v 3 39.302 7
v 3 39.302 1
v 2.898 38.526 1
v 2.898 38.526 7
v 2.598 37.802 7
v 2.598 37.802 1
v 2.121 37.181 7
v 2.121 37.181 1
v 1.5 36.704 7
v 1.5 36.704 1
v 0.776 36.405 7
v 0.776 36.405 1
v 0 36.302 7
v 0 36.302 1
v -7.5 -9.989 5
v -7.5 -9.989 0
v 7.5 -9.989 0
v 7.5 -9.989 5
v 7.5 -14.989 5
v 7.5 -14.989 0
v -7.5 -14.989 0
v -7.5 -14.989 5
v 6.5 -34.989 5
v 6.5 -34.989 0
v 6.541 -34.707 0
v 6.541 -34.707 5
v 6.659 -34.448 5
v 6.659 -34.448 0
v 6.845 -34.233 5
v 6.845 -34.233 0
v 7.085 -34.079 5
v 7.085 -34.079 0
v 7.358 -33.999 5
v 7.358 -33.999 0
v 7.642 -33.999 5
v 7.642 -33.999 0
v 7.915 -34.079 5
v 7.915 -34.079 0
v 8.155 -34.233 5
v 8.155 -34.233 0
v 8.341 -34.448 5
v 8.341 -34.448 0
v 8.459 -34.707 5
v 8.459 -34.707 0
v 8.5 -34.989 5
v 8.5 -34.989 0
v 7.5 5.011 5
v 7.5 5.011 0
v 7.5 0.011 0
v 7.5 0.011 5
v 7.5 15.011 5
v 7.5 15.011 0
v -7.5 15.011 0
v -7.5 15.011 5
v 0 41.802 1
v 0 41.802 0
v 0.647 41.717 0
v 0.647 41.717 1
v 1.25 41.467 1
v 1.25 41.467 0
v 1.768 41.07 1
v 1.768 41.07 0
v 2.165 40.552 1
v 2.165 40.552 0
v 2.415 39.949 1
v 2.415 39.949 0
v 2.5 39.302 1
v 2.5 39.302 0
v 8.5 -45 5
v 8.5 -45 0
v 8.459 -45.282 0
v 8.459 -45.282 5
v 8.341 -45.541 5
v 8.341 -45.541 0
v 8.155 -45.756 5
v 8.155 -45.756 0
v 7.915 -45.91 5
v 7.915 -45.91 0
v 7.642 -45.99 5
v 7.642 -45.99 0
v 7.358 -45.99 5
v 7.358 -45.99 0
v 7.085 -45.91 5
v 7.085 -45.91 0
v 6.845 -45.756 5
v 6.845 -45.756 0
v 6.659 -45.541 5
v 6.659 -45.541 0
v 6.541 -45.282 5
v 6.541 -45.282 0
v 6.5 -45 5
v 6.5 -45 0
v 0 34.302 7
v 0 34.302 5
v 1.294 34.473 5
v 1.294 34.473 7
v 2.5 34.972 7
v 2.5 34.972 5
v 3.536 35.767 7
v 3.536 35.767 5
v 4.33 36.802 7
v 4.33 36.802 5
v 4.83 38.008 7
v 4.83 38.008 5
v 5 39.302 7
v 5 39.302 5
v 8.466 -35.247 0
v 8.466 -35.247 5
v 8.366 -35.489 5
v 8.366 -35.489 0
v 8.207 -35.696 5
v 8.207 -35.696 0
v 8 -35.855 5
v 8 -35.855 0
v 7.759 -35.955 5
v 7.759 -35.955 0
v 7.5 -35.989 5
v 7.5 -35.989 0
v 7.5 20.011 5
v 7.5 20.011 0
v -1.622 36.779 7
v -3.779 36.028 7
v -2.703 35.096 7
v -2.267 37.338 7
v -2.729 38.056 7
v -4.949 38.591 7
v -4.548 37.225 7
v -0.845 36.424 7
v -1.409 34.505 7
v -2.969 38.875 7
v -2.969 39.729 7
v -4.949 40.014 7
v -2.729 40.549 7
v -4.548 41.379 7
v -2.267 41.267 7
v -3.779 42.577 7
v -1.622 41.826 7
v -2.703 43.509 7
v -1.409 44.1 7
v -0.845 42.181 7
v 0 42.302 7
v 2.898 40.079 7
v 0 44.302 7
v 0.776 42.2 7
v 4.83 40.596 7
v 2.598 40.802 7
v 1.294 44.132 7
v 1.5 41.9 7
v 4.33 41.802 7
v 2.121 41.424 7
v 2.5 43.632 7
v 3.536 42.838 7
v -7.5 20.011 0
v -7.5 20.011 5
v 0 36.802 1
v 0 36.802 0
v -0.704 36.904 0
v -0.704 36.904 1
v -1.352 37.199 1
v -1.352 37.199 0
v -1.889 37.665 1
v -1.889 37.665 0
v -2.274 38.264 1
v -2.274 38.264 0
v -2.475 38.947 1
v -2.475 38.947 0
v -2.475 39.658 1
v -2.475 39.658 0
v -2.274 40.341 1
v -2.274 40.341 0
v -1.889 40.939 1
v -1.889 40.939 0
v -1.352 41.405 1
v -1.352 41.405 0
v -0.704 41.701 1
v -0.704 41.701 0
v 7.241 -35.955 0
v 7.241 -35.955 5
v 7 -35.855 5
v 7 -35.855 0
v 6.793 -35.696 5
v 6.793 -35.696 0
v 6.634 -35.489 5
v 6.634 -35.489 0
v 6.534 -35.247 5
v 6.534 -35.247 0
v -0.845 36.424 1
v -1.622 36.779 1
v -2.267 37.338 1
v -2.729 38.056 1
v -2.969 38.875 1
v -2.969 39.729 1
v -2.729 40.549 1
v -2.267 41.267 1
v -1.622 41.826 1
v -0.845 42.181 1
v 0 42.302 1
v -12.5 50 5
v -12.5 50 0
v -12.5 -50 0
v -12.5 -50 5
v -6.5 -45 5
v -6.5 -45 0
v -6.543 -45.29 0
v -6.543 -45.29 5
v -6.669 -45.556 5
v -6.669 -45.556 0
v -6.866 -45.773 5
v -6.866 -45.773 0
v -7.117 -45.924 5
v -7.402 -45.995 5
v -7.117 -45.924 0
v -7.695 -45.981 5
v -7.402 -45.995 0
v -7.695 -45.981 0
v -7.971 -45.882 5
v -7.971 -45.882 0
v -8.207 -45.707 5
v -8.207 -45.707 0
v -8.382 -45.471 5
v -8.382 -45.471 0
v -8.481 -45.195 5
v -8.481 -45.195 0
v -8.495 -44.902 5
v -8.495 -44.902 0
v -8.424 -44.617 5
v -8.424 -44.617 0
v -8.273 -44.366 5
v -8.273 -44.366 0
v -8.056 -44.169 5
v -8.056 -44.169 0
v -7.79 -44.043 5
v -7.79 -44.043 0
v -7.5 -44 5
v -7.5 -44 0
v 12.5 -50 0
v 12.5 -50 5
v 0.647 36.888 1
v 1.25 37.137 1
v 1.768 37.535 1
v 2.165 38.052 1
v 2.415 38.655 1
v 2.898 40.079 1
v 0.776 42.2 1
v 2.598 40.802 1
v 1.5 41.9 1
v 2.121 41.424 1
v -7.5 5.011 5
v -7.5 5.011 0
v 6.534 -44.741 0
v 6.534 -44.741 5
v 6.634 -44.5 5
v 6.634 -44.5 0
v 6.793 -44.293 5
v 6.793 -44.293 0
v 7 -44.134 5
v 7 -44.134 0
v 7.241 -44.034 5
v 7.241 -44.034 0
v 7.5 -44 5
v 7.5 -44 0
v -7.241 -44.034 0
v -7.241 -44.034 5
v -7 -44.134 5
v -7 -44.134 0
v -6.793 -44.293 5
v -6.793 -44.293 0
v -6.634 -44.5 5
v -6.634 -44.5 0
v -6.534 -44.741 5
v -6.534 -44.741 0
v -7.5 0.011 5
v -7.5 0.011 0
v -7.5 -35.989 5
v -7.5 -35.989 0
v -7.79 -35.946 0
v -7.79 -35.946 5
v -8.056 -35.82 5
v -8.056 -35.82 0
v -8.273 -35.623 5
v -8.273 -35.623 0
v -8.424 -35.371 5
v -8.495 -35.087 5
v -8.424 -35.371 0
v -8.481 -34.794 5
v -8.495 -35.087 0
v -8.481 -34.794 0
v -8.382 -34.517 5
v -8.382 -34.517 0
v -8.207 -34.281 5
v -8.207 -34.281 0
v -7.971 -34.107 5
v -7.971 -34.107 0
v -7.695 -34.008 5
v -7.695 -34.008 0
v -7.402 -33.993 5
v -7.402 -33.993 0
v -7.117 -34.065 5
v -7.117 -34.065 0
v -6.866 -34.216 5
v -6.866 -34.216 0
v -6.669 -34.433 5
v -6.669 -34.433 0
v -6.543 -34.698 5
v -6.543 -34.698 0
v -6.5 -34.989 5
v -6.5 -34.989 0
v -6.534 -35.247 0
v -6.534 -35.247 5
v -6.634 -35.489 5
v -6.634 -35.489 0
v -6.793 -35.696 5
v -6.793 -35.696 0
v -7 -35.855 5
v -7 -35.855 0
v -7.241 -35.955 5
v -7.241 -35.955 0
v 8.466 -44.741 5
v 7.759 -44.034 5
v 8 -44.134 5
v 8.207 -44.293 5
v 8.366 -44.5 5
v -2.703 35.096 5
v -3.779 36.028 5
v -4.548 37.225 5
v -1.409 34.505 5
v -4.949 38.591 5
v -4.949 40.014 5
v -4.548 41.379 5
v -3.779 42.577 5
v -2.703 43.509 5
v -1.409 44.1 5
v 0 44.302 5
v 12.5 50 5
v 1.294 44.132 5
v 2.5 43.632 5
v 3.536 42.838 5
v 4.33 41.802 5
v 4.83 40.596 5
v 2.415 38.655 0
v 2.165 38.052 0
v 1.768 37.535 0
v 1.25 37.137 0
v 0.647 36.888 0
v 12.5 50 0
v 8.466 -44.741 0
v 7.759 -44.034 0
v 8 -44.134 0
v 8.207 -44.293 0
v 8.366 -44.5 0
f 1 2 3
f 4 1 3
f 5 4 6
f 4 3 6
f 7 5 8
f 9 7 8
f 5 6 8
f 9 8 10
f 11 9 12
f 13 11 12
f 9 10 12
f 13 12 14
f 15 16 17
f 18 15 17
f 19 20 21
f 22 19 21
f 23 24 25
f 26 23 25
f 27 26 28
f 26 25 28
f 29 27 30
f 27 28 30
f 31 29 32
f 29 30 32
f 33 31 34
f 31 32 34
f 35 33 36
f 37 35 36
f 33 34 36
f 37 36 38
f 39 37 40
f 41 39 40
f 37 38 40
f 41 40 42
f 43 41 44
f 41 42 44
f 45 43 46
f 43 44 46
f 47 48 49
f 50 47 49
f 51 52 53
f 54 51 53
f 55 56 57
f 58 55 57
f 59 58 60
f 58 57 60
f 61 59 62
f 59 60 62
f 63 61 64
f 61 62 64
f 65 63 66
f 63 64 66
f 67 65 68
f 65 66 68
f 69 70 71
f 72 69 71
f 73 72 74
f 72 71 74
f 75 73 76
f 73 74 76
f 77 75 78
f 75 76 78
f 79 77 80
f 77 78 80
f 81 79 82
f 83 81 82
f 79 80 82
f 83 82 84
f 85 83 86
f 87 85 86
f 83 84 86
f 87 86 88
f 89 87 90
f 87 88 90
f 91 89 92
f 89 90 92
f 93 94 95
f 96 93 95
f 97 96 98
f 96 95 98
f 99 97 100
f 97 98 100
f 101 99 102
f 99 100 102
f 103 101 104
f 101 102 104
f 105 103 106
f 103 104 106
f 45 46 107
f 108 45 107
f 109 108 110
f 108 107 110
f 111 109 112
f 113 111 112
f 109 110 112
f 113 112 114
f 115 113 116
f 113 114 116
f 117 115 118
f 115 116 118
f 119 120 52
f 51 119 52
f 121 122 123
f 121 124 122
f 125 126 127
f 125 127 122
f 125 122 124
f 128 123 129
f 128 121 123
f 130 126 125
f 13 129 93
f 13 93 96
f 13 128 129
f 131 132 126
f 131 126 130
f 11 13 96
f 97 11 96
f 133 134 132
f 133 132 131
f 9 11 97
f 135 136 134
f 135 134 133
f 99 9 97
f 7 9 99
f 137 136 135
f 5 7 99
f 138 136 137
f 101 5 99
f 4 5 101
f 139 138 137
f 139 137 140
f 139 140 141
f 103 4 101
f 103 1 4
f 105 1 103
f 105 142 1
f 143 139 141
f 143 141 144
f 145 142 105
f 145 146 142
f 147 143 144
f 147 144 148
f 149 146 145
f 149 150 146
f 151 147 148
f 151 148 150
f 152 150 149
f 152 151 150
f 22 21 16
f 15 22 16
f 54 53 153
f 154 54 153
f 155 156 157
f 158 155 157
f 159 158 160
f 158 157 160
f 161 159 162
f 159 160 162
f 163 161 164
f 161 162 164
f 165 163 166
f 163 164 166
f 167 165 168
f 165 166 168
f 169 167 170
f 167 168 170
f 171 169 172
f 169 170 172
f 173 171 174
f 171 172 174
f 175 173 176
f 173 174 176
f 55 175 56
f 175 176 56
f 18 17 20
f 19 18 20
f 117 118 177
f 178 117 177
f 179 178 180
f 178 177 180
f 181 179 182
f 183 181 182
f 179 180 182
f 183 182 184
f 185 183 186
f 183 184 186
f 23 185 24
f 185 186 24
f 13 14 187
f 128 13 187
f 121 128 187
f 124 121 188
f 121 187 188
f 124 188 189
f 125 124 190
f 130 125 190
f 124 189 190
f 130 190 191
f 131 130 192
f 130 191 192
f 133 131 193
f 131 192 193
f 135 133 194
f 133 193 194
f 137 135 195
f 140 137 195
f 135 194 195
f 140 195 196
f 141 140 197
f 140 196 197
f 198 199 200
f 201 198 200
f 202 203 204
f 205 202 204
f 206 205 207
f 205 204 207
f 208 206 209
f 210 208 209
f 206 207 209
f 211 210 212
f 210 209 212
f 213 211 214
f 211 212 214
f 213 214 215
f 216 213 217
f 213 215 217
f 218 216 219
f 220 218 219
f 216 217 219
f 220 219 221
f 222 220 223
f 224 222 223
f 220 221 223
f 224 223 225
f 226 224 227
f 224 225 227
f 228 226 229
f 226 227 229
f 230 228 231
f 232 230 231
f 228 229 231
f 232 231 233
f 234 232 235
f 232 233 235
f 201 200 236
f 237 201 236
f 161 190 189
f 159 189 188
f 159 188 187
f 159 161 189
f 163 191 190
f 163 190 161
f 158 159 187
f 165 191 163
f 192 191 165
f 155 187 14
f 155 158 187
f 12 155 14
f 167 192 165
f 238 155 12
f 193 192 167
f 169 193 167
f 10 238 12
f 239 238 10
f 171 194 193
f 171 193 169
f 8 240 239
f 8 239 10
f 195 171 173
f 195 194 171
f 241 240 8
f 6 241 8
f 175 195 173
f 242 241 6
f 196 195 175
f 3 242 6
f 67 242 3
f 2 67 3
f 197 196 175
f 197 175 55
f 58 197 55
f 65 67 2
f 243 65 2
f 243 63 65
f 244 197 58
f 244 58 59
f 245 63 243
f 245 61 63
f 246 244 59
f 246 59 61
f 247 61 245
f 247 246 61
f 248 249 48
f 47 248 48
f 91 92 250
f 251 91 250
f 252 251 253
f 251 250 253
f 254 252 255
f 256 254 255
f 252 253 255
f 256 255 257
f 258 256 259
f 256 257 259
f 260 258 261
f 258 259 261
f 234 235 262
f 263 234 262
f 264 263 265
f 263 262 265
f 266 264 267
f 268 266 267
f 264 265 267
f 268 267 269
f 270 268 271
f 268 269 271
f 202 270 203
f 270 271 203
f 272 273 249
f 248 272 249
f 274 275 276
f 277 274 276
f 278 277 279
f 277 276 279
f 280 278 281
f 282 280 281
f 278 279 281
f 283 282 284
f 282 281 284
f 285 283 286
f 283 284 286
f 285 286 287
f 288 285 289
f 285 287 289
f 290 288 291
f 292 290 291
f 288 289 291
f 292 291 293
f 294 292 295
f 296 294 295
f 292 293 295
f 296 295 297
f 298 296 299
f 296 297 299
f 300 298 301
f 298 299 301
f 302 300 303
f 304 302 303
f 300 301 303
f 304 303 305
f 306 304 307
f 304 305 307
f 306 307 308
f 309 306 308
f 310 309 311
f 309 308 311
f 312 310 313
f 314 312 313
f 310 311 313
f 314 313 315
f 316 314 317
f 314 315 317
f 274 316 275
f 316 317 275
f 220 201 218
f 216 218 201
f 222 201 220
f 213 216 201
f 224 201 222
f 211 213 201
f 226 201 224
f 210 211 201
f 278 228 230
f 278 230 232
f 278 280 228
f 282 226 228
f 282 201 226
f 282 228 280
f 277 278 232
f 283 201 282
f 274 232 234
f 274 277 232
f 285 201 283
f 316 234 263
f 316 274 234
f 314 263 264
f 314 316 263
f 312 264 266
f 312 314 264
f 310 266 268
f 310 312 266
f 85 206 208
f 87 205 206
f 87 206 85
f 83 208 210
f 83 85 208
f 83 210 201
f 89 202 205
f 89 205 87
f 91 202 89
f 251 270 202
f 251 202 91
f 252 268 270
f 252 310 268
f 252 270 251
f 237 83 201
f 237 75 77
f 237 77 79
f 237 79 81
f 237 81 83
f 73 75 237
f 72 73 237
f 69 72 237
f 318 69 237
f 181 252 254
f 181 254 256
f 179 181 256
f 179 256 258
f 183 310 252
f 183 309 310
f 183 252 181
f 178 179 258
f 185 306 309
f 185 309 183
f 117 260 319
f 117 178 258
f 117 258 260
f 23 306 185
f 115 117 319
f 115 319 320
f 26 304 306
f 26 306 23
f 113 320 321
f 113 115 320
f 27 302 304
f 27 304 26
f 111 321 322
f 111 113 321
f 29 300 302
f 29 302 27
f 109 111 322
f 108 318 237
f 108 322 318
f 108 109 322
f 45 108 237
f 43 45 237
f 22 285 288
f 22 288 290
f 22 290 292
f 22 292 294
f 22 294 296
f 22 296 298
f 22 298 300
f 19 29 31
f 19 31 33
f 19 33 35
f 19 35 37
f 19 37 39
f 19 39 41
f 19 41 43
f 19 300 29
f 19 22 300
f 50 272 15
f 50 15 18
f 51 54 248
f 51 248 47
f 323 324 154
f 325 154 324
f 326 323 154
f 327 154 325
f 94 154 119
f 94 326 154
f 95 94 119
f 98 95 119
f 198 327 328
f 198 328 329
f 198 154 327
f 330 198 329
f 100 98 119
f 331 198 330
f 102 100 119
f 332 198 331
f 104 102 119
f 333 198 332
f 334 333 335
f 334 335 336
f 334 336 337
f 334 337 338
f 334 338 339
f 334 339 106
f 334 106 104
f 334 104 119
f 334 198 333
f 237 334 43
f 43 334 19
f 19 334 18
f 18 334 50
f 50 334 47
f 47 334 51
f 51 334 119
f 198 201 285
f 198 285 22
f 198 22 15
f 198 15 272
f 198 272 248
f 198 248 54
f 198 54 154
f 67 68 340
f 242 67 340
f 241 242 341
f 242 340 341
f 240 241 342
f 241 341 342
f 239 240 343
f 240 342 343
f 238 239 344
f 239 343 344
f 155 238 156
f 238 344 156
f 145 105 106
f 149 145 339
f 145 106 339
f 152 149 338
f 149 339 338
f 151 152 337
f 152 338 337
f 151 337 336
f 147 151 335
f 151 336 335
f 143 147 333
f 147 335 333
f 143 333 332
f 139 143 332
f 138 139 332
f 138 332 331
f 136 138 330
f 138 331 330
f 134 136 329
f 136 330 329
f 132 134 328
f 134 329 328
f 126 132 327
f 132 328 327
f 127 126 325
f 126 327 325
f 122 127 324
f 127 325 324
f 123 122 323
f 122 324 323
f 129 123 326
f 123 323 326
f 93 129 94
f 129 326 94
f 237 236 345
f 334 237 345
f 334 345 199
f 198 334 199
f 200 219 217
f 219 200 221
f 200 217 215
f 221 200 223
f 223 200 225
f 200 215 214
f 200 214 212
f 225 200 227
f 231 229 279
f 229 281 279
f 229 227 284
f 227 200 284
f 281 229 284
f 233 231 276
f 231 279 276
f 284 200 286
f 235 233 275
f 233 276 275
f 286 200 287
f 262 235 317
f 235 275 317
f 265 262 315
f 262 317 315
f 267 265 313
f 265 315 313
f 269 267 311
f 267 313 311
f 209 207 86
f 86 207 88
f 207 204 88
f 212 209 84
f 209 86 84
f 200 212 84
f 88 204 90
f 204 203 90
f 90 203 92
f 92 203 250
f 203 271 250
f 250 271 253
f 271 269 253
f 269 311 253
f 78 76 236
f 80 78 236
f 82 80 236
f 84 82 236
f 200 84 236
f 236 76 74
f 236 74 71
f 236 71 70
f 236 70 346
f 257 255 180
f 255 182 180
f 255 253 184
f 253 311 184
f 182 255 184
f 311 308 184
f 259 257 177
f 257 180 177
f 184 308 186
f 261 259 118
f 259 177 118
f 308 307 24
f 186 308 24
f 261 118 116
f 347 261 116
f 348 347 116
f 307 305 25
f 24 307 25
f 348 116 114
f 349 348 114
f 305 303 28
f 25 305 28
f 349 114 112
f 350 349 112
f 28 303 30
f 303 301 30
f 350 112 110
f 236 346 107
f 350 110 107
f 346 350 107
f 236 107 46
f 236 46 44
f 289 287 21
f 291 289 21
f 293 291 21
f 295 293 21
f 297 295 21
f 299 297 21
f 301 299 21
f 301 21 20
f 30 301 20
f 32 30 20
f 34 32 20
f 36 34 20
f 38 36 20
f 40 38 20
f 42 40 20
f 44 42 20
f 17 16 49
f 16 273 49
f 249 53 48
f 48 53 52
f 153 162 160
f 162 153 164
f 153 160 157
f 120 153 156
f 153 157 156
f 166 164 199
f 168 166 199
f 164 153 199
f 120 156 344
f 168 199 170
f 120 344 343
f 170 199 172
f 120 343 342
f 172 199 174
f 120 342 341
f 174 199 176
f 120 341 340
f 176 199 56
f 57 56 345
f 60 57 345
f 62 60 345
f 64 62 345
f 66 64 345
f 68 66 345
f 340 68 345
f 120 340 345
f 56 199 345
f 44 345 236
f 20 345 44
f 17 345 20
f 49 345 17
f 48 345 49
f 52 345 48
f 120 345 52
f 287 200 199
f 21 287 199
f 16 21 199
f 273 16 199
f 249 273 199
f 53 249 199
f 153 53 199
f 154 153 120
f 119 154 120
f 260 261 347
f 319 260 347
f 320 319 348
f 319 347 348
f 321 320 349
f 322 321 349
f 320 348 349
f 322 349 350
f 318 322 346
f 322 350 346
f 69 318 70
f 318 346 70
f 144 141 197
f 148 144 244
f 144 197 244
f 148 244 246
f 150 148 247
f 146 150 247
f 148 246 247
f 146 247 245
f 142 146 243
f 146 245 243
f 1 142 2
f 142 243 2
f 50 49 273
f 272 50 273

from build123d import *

# Parameters (mm, degrees)
F1_DEPTH = 5
F2_DEPTH = 7
F3_DEPTH = 1


with BuildPart() as f1:
    # F0 (on Top) → F1 (new body)
    with BuildSketch(Plane.XY):
        with BuildLine():
            Line((-12.5, -50), (0, -50))
            Line((0, -50), (0, -45))
            Line((0, -45), (-6.5, -45))
            ThreePointArc((-6.5, -45), (-8.2071067812, -45.7071067812), (-7.5, -44))
            Line((-7.5, -44), (-7.5, -35.9886))
            ThreePointArc((-7.5, -35.9886), (-8.2071067812, -34.2814932188), (-6.5, -34.9886))
            Line((-6.5, -34.9886), (0, -34.9886))
            Line((0, -34.9886), (0, -14.9886))
            Line((0, -14.9886), (-7.5, -14.9886))
            Line((-7.5, -14.9886), (-7.5, -9.9886))
            Line((-7.5, -9.9886), (0, -9.9886))
            Line((0, -9.9886), (0, 0.0114))
            Line((0, 0.0114), (-7.5, 0.0114))
            Line((-7.5, 0.0114), (-7.5, 5.0114))
            Line((-7.5, 5.0114), (0, 5.0114))
            Line((0, 5.0114), (0, 15.0114))
            Line((0, 15.0114), (-7.5, 15.0114))
            Line((-7.5, 15.0114), (-7.5, 20.0114))
            Line((-7.5, 20.0114), (0, 20.0114))
            Line((0, 20.0114), (0, 34.3023235092))
            ThreePointArc((0, 34.3023235092), (-5, 39.3023235092), (0, 44.3023235092))
            Line((0, 44.3023235092), (0, 50))
            Line((0, 50), (-12.5, 50))
            Line((-12.5, 50), (-12.5, -50))
        make_face()
        with BuildLine():
            Line((0, -50), (12.5, -50))
            Line((12.5, -50), (12.5, 50))
            Line((12.5, 50), (0, 50))
            Line((0, 50), (0, 44.3023235092))
            ThreePointArc((0, 44.3023235092), (3.5355339059, 42.8378574152), (5, 39.3023235092))
            ThreePointArc((5, 39.3023235092), (3.5355339059, 35.7667896033), (0, 34.3023235092))
            Line((0, 34.3023235092), (0, 20.0114))
            Line((0, 20.0114), (7.5, 20.0114))
            Line((7.5, 20.0114), (7.5, 15.0114))
            Line((7.5, 15.0114), (0, 15.0114))
            Line((0, 15.0114), (0, 5.0114))
            Line((0, 5.0114), (7.5, 5.0114))
            Line((7.5, 5.0114), (7.5, 0.0114))
            Line((7.5, 0.0114), (0, 0.0114))
            Line((0, 0.0114), (0, -9.9886))
            Line((0, -9.9886), (7.5, -9.9886))
            Line((7.5, -9.9886), (7.5, -14.9886))
            Line((7.5, -14.9886), (0, -14.9886))
            Line((0, -14.9886), (0, -34.9886))
            Line((0, -34.9886), (6.5, -34.9886))
            ThreePointArc((6.5, -34.9886), (7.5, -33.9886), (8.5, -34.9886))
            ThreePointArc((8.5, -34.9886), (8.2071067812, -35.6957067812), (7.5, -35.9886))
            Line((7.5, -35.9886), (7.5, -44))
            ThreePointArc((7.5, -44), (8.2071067812, -44.2928932188), (8.5, -45))
            ThreePointArc((8.5, -45), (7.5, -46), (6.5, -45))
            Line((6.5, -45), (0, -45))
            Line((0, -45), (0, -50))
        make_face()
        with BuildLine():
            Line((0, -34.9886), (0, -45))
            Line((0, -45), (6.5, -45))
            ThreePointArc((6.5, -45), (6.7928932188, -44.2928932188), (7.5, -44))
            Line((7.5, -44), (7.5, -35.9886))
            ThreePointArc((7.5, -35.9886), (6.7928932188, -35.6957067812), (6.5, -34.9886))
            Line((6.5, -34.9886), (0, -34.9886))
        make_face()
        with BuildLine():
            Line((-6.5, -45), (0, -45))
            Line((0, -45), (0, -34.9886))
            Line((0, -34.9886), (-6.5, -34.9886))
            ThreePointArc((-6.5, -34.9886), (-6.7928932188, -35.6957067812), (-7.5, -35.9886))
            Line((-7.5, -35.9886), (-7.5, -44))
            ThreePointArc((-7.5, -44), (-6.7928932188, -44.2928932188), (-6.5, -45))
        make_face()
    extrude(amount=F1_DEPTH)

    # F0 (on Top) → F2 (join)
    with BuildSketch(Plane.XY):
        with BuildLine():
            Line((0, 42.3023235092), (0, 44.3023235092))
            ThreePointArc((0, 44.3023235092), (-5, 39.3023235092), (0, 34.3023235092))
            Line((0, 34.3023235092), (0, 36.3023235092))
            ThreePointArc((0, 36.3023235092), (-3, 39.3023235092), (0, 42.3023235092))
        make_face()
        with BuildLine():
            ThreePointArc((5, 39.3023235092), (3.5355339059, 42.8378574152), (0, 44.3023235092))
            Line((0, 44.3023235092), (0, 42.3023235092))
            ThreePointArc((0, 42.3023235092), (2.1213203436, 41.4236438528), (3, 39.3023235092))
            ThreePointArc((3, 39.3023235092), (2.1213203436, 37.1810031657), (0, 36.3023235092))
            Line((0, 36.3023235092), (0, 34.3023235092))
            ThreePointArc((0, 34.3023235092), (3.5355339059, 35.7667896033), (5, 39.3023235092))
        make_face()
    extrude(amount=F2_DEPTH)

    # F0 (on Top) → F3 (join)
    with BuildSketch(Plane.XY):
        with BuildLine():
            Line((0, 41.8023235092), (0, 42.3023235092))
            ThreePointArc((0, 42.3023235092), (-3, 39.3023235092), (0, 36.3023235092))
            Line((0, 36.3023235092), (0, 36.8023235092))
            ThreePointArc((0, 36.8023235092), (-2.5, 39.3023235092), (0, 41.8023235092))
        make_face()
        with BuildLine():
            ThreePointArc((3, 39.3023235092), (2.1213203436, 41.4236438528), (0, 42.3023235092))
            Line((0, 42.3023235092), (0, 41.8023235092))
            ThreePointArc((0, 41.8023235092), (1.767766953, 41.0700904622), (2.5, 39.3023235092))
            ThreePointArc((2.5, 39.3023235092), (1.767766953, 37.5345565563), (0, 36.8023235092))
            Line((0, 36.8023235092), (0, 36.3023235092))
            ThreePointArc((0, 36.3023235092), (2.1213203436, 37.1810031657), (3, 39.3023235092))
        make_face()
    extrude(amount=F3_DEPTH)


solid = f1.part
